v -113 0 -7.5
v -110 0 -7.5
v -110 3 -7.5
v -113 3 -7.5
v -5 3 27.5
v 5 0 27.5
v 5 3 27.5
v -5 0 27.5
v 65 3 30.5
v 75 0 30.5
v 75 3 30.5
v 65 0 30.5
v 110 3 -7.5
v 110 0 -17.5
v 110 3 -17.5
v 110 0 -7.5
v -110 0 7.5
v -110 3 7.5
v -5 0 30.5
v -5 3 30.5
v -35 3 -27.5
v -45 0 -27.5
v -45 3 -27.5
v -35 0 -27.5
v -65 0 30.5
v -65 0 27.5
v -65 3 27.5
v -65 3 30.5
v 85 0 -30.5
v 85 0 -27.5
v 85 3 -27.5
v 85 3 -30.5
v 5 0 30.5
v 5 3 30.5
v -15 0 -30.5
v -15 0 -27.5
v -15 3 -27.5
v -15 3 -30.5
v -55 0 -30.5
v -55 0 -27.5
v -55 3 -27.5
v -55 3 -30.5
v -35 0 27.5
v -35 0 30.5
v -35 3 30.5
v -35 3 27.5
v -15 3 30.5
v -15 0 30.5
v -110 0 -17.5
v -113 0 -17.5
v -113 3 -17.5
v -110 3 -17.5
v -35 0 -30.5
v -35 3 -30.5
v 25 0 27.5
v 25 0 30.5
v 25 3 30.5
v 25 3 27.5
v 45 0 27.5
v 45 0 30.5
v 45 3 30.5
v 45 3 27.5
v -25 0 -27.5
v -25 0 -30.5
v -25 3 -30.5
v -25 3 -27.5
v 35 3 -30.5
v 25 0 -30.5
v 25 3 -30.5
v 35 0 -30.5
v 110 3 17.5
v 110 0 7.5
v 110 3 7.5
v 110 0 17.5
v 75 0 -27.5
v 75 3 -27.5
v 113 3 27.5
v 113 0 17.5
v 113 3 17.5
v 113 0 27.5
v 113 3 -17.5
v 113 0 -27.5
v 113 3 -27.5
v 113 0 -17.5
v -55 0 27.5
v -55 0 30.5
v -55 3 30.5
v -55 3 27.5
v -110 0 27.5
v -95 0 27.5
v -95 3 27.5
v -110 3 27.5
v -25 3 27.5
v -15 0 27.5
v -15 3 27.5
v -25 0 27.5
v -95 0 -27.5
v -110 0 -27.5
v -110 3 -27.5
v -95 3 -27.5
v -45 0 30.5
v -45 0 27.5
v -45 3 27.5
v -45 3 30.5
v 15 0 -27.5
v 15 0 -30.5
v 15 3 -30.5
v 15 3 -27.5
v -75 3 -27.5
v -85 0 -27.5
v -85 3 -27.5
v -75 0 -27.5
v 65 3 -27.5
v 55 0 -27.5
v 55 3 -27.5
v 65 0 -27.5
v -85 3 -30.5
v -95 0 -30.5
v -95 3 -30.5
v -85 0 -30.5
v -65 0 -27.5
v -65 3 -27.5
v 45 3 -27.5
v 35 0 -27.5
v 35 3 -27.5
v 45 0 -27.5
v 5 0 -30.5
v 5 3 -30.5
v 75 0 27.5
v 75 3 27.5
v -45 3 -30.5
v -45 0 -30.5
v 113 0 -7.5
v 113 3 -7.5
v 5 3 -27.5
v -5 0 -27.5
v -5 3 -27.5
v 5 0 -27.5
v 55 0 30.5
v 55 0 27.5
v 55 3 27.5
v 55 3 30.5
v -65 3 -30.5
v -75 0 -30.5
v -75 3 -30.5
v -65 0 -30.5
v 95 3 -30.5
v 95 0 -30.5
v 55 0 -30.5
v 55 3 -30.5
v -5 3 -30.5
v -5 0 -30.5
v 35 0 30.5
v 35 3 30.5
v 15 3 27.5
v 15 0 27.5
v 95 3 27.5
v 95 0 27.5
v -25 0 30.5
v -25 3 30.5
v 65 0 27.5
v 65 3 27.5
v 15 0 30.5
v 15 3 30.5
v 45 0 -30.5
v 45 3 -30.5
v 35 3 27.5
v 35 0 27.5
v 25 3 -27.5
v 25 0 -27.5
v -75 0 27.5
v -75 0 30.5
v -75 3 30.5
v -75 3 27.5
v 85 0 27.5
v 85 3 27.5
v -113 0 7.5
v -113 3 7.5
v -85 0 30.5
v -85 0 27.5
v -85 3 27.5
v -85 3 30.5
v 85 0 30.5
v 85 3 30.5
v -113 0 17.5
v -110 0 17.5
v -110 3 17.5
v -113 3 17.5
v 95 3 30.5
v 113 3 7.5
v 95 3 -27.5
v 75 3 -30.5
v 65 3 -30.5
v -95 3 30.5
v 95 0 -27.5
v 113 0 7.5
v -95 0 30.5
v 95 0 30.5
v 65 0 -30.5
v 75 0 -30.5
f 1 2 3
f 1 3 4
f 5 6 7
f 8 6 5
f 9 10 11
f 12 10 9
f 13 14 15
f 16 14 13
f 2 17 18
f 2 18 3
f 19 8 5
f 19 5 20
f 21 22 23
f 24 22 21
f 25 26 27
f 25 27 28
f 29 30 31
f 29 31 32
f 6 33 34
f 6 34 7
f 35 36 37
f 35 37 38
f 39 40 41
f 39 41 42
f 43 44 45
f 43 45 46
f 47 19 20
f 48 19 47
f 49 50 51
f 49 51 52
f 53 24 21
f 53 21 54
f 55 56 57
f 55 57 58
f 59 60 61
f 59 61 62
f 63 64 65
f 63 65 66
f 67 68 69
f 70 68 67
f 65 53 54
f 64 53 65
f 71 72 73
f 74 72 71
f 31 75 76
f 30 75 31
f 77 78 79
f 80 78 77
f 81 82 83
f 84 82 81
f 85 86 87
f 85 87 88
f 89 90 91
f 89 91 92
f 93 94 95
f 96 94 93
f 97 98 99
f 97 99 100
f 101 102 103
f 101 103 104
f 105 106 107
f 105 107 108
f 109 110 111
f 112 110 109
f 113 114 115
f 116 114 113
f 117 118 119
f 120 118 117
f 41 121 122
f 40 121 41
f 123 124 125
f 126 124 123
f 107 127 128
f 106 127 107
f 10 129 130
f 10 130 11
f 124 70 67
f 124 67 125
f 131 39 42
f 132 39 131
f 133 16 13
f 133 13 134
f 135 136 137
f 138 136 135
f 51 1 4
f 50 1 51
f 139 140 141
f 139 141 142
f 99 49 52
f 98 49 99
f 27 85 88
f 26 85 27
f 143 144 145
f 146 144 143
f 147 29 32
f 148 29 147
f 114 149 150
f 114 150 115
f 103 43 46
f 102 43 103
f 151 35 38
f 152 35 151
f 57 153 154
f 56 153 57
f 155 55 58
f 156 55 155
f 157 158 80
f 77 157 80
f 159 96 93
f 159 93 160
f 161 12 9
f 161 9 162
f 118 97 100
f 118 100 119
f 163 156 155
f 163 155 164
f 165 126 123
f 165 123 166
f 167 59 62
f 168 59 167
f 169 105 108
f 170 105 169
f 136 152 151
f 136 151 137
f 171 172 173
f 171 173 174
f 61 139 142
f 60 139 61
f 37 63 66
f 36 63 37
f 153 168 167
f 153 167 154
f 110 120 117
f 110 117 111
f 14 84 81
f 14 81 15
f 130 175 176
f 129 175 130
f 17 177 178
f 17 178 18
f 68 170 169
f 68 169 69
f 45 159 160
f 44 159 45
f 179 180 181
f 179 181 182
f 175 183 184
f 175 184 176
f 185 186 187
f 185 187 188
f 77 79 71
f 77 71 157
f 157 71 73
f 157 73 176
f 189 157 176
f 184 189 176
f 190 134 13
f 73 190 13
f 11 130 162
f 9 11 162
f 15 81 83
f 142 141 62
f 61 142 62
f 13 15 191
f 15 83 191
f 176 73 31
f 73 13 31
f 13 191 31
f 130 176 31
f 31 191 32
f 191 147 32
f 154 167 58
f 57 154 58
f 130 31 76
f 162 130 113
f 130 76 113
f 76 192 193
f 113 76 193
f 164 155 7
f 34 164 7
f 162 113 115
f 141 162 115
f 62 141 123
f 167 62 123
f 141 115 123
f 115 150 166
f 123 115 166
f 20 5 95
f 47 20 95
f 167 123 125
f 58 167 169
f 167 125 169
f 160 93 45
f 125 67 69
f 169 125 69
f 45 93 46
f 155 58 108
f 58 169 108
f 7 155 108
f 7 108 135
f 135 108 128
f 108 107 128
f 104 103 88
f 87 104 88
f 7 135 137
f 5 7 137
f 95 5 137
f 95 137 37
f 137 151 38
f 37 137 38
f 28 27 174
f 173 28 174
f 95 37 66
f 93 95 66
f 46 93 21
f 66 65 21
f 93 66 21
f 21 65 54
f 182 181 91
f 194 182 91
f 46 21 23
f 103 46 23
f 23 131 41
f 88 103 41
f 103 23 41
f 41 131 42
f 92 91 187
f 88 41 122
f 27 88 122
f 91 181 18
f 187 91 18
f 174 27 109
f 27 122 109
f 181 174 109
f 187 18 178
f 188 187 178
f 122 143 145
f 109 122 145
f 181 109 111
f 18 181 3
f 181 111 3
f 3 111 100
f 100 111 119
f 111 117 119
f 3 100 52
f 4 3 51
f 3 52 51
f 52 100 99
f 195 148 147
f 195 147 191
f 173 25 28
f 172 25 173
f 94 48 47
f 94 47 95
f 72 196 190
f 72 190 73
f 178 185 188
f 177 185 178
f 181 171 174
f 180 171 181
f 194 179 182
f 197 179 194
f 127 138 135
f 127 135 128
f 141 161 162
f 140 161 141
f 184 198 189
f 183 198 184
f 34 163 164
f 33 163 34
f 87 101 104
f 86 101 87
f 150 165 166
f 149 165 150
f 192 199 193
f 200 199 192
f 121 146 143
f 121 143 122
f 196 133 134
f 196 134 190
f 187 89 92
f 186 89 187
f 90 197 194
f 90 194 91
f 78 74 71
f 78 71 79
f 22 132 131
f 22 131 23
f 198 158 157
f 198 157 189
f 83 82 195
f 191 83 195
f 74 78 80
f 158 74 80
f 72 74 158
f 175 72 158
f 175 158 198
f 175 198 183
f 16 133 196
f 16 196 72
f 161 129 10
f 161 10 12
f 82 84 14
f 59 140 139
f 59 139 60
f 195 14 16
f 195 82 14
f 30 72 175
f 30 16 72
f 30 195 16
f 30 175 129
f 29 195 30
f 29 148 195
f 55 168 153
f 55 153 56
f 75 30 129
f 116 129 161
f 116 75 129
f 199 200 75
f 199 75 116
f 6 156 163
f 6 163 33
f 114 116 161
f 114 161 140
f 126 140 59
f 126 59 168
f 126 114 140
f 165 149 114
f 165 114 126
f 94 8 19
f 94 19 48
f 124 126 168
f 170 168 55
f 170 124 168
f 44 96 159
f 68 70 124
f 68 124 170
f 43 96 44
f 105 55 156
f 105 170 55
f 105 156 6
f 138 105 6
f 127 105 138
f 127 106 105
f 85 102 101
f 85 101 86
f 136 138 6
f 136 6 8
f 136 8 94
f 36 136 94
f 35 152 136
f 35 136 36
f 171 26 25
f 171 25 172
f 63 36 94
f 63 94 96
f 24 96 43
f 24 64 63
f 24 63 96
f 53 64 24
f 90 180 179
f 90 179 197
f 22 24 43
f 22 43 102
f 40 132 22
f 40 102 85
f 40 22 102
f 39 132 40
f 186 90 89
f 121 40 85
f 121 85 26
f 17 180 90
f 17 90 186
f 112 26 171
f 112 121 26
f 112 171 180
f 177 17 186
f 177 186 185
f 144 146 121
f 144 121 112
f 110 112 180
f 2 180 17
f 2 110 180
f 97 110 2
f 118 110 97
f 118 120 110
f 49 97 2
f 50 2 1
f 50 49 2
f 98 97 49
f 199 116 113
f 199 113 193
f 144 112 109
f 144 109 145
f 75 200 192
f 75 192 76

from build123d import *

# Parameters (mm, degrees)
EXTRUDE_2_DEPTH = 3


with BuildPart() as part:
    # Эскиз3 → Бобышка-Вытянуть2 (new body)
    with BuildSketch(Plane(origin=(0, 0, 0), x_dir=(1, 0, 0), z_dir=(0, 1, 0))):
        Polygon((-75, 27.5), (-75, 30.5), (-65, 30.5), (-65, 27.5), (-55, 27.5), (-55, 30.5), (-45, 30.5), (-45, 27.5), (-35, 27.5), (-35, 30.5), (-25, 30.5), (-25, 27.5), (-15, 27.5), (-15, 30.5), (-5, 30.5), (-5, 27.5), (5, 27.5), (5, 30.5), (15, 30.5), (15, 27.5), (25, 27.5), (25, 30.5), (35, 30.5), (35, 27.5), (45, 27.5), (45, 30.5), (55, 30.5), (55, 27.5), (65, 27.5), (65, 30.5), (75, 30.5), (75, 27.5), (85, 27.5), (85, 30.5), (95, 30.5), (95, 27.5), (110, 27.5), (113, 27.5), (113, 17.5), (110, 17.5), (110, 7.5), (113, 7.5), (113, -7.5), (110, -7.5), (110, -17.5), (113, -17.5), (113, -27.5), (110, -27.5), (95, -27.5), (95, -30.5), (85, -30.5), (85, -27.5), (75, -27.5), (75, -30.5), (65, -30.5), (65, -27.5), (55, -27.5), (55, -30.5), (45, -30.5), (45, -27.5), (35, -27.5), (35, -30.5), (25, -30.5), (25, -27.5), (15, -27.5), (15, -30.5), (5, -30.5), (5, -27.5), (-5, -27.5), (-5, -30.5), (-15, -30.5), (-15, -27.5), (-25, -27.5), (-25, -30.5), (-35, -30.5), (-35, -27.5), (-45, -27.5), (-45, -30.5), (-55, -30.5), (-55, -27.5), (-65, -27.5), (-65, -30.5), (-75, -30.5), (-75, -27.5), (-85, -27.5), (-85, -30.5), (-95, -30.5), (-95, -27.5), (-110, -27.5), (-110, -17.5), (-113, -17.5), (-113, -7.5), (-110, -7.5), (-110, 7.5), (-113, 7.5), (-113, 17.5), (-110, 17.5), (-110, 27.5), (-95, 27.5), (-95, 30.5), (-85, 30.5), (-85, 27.5), align=None)
    extrude(amount=EXTRUDE_2_DEPTH)


solid = part.part
